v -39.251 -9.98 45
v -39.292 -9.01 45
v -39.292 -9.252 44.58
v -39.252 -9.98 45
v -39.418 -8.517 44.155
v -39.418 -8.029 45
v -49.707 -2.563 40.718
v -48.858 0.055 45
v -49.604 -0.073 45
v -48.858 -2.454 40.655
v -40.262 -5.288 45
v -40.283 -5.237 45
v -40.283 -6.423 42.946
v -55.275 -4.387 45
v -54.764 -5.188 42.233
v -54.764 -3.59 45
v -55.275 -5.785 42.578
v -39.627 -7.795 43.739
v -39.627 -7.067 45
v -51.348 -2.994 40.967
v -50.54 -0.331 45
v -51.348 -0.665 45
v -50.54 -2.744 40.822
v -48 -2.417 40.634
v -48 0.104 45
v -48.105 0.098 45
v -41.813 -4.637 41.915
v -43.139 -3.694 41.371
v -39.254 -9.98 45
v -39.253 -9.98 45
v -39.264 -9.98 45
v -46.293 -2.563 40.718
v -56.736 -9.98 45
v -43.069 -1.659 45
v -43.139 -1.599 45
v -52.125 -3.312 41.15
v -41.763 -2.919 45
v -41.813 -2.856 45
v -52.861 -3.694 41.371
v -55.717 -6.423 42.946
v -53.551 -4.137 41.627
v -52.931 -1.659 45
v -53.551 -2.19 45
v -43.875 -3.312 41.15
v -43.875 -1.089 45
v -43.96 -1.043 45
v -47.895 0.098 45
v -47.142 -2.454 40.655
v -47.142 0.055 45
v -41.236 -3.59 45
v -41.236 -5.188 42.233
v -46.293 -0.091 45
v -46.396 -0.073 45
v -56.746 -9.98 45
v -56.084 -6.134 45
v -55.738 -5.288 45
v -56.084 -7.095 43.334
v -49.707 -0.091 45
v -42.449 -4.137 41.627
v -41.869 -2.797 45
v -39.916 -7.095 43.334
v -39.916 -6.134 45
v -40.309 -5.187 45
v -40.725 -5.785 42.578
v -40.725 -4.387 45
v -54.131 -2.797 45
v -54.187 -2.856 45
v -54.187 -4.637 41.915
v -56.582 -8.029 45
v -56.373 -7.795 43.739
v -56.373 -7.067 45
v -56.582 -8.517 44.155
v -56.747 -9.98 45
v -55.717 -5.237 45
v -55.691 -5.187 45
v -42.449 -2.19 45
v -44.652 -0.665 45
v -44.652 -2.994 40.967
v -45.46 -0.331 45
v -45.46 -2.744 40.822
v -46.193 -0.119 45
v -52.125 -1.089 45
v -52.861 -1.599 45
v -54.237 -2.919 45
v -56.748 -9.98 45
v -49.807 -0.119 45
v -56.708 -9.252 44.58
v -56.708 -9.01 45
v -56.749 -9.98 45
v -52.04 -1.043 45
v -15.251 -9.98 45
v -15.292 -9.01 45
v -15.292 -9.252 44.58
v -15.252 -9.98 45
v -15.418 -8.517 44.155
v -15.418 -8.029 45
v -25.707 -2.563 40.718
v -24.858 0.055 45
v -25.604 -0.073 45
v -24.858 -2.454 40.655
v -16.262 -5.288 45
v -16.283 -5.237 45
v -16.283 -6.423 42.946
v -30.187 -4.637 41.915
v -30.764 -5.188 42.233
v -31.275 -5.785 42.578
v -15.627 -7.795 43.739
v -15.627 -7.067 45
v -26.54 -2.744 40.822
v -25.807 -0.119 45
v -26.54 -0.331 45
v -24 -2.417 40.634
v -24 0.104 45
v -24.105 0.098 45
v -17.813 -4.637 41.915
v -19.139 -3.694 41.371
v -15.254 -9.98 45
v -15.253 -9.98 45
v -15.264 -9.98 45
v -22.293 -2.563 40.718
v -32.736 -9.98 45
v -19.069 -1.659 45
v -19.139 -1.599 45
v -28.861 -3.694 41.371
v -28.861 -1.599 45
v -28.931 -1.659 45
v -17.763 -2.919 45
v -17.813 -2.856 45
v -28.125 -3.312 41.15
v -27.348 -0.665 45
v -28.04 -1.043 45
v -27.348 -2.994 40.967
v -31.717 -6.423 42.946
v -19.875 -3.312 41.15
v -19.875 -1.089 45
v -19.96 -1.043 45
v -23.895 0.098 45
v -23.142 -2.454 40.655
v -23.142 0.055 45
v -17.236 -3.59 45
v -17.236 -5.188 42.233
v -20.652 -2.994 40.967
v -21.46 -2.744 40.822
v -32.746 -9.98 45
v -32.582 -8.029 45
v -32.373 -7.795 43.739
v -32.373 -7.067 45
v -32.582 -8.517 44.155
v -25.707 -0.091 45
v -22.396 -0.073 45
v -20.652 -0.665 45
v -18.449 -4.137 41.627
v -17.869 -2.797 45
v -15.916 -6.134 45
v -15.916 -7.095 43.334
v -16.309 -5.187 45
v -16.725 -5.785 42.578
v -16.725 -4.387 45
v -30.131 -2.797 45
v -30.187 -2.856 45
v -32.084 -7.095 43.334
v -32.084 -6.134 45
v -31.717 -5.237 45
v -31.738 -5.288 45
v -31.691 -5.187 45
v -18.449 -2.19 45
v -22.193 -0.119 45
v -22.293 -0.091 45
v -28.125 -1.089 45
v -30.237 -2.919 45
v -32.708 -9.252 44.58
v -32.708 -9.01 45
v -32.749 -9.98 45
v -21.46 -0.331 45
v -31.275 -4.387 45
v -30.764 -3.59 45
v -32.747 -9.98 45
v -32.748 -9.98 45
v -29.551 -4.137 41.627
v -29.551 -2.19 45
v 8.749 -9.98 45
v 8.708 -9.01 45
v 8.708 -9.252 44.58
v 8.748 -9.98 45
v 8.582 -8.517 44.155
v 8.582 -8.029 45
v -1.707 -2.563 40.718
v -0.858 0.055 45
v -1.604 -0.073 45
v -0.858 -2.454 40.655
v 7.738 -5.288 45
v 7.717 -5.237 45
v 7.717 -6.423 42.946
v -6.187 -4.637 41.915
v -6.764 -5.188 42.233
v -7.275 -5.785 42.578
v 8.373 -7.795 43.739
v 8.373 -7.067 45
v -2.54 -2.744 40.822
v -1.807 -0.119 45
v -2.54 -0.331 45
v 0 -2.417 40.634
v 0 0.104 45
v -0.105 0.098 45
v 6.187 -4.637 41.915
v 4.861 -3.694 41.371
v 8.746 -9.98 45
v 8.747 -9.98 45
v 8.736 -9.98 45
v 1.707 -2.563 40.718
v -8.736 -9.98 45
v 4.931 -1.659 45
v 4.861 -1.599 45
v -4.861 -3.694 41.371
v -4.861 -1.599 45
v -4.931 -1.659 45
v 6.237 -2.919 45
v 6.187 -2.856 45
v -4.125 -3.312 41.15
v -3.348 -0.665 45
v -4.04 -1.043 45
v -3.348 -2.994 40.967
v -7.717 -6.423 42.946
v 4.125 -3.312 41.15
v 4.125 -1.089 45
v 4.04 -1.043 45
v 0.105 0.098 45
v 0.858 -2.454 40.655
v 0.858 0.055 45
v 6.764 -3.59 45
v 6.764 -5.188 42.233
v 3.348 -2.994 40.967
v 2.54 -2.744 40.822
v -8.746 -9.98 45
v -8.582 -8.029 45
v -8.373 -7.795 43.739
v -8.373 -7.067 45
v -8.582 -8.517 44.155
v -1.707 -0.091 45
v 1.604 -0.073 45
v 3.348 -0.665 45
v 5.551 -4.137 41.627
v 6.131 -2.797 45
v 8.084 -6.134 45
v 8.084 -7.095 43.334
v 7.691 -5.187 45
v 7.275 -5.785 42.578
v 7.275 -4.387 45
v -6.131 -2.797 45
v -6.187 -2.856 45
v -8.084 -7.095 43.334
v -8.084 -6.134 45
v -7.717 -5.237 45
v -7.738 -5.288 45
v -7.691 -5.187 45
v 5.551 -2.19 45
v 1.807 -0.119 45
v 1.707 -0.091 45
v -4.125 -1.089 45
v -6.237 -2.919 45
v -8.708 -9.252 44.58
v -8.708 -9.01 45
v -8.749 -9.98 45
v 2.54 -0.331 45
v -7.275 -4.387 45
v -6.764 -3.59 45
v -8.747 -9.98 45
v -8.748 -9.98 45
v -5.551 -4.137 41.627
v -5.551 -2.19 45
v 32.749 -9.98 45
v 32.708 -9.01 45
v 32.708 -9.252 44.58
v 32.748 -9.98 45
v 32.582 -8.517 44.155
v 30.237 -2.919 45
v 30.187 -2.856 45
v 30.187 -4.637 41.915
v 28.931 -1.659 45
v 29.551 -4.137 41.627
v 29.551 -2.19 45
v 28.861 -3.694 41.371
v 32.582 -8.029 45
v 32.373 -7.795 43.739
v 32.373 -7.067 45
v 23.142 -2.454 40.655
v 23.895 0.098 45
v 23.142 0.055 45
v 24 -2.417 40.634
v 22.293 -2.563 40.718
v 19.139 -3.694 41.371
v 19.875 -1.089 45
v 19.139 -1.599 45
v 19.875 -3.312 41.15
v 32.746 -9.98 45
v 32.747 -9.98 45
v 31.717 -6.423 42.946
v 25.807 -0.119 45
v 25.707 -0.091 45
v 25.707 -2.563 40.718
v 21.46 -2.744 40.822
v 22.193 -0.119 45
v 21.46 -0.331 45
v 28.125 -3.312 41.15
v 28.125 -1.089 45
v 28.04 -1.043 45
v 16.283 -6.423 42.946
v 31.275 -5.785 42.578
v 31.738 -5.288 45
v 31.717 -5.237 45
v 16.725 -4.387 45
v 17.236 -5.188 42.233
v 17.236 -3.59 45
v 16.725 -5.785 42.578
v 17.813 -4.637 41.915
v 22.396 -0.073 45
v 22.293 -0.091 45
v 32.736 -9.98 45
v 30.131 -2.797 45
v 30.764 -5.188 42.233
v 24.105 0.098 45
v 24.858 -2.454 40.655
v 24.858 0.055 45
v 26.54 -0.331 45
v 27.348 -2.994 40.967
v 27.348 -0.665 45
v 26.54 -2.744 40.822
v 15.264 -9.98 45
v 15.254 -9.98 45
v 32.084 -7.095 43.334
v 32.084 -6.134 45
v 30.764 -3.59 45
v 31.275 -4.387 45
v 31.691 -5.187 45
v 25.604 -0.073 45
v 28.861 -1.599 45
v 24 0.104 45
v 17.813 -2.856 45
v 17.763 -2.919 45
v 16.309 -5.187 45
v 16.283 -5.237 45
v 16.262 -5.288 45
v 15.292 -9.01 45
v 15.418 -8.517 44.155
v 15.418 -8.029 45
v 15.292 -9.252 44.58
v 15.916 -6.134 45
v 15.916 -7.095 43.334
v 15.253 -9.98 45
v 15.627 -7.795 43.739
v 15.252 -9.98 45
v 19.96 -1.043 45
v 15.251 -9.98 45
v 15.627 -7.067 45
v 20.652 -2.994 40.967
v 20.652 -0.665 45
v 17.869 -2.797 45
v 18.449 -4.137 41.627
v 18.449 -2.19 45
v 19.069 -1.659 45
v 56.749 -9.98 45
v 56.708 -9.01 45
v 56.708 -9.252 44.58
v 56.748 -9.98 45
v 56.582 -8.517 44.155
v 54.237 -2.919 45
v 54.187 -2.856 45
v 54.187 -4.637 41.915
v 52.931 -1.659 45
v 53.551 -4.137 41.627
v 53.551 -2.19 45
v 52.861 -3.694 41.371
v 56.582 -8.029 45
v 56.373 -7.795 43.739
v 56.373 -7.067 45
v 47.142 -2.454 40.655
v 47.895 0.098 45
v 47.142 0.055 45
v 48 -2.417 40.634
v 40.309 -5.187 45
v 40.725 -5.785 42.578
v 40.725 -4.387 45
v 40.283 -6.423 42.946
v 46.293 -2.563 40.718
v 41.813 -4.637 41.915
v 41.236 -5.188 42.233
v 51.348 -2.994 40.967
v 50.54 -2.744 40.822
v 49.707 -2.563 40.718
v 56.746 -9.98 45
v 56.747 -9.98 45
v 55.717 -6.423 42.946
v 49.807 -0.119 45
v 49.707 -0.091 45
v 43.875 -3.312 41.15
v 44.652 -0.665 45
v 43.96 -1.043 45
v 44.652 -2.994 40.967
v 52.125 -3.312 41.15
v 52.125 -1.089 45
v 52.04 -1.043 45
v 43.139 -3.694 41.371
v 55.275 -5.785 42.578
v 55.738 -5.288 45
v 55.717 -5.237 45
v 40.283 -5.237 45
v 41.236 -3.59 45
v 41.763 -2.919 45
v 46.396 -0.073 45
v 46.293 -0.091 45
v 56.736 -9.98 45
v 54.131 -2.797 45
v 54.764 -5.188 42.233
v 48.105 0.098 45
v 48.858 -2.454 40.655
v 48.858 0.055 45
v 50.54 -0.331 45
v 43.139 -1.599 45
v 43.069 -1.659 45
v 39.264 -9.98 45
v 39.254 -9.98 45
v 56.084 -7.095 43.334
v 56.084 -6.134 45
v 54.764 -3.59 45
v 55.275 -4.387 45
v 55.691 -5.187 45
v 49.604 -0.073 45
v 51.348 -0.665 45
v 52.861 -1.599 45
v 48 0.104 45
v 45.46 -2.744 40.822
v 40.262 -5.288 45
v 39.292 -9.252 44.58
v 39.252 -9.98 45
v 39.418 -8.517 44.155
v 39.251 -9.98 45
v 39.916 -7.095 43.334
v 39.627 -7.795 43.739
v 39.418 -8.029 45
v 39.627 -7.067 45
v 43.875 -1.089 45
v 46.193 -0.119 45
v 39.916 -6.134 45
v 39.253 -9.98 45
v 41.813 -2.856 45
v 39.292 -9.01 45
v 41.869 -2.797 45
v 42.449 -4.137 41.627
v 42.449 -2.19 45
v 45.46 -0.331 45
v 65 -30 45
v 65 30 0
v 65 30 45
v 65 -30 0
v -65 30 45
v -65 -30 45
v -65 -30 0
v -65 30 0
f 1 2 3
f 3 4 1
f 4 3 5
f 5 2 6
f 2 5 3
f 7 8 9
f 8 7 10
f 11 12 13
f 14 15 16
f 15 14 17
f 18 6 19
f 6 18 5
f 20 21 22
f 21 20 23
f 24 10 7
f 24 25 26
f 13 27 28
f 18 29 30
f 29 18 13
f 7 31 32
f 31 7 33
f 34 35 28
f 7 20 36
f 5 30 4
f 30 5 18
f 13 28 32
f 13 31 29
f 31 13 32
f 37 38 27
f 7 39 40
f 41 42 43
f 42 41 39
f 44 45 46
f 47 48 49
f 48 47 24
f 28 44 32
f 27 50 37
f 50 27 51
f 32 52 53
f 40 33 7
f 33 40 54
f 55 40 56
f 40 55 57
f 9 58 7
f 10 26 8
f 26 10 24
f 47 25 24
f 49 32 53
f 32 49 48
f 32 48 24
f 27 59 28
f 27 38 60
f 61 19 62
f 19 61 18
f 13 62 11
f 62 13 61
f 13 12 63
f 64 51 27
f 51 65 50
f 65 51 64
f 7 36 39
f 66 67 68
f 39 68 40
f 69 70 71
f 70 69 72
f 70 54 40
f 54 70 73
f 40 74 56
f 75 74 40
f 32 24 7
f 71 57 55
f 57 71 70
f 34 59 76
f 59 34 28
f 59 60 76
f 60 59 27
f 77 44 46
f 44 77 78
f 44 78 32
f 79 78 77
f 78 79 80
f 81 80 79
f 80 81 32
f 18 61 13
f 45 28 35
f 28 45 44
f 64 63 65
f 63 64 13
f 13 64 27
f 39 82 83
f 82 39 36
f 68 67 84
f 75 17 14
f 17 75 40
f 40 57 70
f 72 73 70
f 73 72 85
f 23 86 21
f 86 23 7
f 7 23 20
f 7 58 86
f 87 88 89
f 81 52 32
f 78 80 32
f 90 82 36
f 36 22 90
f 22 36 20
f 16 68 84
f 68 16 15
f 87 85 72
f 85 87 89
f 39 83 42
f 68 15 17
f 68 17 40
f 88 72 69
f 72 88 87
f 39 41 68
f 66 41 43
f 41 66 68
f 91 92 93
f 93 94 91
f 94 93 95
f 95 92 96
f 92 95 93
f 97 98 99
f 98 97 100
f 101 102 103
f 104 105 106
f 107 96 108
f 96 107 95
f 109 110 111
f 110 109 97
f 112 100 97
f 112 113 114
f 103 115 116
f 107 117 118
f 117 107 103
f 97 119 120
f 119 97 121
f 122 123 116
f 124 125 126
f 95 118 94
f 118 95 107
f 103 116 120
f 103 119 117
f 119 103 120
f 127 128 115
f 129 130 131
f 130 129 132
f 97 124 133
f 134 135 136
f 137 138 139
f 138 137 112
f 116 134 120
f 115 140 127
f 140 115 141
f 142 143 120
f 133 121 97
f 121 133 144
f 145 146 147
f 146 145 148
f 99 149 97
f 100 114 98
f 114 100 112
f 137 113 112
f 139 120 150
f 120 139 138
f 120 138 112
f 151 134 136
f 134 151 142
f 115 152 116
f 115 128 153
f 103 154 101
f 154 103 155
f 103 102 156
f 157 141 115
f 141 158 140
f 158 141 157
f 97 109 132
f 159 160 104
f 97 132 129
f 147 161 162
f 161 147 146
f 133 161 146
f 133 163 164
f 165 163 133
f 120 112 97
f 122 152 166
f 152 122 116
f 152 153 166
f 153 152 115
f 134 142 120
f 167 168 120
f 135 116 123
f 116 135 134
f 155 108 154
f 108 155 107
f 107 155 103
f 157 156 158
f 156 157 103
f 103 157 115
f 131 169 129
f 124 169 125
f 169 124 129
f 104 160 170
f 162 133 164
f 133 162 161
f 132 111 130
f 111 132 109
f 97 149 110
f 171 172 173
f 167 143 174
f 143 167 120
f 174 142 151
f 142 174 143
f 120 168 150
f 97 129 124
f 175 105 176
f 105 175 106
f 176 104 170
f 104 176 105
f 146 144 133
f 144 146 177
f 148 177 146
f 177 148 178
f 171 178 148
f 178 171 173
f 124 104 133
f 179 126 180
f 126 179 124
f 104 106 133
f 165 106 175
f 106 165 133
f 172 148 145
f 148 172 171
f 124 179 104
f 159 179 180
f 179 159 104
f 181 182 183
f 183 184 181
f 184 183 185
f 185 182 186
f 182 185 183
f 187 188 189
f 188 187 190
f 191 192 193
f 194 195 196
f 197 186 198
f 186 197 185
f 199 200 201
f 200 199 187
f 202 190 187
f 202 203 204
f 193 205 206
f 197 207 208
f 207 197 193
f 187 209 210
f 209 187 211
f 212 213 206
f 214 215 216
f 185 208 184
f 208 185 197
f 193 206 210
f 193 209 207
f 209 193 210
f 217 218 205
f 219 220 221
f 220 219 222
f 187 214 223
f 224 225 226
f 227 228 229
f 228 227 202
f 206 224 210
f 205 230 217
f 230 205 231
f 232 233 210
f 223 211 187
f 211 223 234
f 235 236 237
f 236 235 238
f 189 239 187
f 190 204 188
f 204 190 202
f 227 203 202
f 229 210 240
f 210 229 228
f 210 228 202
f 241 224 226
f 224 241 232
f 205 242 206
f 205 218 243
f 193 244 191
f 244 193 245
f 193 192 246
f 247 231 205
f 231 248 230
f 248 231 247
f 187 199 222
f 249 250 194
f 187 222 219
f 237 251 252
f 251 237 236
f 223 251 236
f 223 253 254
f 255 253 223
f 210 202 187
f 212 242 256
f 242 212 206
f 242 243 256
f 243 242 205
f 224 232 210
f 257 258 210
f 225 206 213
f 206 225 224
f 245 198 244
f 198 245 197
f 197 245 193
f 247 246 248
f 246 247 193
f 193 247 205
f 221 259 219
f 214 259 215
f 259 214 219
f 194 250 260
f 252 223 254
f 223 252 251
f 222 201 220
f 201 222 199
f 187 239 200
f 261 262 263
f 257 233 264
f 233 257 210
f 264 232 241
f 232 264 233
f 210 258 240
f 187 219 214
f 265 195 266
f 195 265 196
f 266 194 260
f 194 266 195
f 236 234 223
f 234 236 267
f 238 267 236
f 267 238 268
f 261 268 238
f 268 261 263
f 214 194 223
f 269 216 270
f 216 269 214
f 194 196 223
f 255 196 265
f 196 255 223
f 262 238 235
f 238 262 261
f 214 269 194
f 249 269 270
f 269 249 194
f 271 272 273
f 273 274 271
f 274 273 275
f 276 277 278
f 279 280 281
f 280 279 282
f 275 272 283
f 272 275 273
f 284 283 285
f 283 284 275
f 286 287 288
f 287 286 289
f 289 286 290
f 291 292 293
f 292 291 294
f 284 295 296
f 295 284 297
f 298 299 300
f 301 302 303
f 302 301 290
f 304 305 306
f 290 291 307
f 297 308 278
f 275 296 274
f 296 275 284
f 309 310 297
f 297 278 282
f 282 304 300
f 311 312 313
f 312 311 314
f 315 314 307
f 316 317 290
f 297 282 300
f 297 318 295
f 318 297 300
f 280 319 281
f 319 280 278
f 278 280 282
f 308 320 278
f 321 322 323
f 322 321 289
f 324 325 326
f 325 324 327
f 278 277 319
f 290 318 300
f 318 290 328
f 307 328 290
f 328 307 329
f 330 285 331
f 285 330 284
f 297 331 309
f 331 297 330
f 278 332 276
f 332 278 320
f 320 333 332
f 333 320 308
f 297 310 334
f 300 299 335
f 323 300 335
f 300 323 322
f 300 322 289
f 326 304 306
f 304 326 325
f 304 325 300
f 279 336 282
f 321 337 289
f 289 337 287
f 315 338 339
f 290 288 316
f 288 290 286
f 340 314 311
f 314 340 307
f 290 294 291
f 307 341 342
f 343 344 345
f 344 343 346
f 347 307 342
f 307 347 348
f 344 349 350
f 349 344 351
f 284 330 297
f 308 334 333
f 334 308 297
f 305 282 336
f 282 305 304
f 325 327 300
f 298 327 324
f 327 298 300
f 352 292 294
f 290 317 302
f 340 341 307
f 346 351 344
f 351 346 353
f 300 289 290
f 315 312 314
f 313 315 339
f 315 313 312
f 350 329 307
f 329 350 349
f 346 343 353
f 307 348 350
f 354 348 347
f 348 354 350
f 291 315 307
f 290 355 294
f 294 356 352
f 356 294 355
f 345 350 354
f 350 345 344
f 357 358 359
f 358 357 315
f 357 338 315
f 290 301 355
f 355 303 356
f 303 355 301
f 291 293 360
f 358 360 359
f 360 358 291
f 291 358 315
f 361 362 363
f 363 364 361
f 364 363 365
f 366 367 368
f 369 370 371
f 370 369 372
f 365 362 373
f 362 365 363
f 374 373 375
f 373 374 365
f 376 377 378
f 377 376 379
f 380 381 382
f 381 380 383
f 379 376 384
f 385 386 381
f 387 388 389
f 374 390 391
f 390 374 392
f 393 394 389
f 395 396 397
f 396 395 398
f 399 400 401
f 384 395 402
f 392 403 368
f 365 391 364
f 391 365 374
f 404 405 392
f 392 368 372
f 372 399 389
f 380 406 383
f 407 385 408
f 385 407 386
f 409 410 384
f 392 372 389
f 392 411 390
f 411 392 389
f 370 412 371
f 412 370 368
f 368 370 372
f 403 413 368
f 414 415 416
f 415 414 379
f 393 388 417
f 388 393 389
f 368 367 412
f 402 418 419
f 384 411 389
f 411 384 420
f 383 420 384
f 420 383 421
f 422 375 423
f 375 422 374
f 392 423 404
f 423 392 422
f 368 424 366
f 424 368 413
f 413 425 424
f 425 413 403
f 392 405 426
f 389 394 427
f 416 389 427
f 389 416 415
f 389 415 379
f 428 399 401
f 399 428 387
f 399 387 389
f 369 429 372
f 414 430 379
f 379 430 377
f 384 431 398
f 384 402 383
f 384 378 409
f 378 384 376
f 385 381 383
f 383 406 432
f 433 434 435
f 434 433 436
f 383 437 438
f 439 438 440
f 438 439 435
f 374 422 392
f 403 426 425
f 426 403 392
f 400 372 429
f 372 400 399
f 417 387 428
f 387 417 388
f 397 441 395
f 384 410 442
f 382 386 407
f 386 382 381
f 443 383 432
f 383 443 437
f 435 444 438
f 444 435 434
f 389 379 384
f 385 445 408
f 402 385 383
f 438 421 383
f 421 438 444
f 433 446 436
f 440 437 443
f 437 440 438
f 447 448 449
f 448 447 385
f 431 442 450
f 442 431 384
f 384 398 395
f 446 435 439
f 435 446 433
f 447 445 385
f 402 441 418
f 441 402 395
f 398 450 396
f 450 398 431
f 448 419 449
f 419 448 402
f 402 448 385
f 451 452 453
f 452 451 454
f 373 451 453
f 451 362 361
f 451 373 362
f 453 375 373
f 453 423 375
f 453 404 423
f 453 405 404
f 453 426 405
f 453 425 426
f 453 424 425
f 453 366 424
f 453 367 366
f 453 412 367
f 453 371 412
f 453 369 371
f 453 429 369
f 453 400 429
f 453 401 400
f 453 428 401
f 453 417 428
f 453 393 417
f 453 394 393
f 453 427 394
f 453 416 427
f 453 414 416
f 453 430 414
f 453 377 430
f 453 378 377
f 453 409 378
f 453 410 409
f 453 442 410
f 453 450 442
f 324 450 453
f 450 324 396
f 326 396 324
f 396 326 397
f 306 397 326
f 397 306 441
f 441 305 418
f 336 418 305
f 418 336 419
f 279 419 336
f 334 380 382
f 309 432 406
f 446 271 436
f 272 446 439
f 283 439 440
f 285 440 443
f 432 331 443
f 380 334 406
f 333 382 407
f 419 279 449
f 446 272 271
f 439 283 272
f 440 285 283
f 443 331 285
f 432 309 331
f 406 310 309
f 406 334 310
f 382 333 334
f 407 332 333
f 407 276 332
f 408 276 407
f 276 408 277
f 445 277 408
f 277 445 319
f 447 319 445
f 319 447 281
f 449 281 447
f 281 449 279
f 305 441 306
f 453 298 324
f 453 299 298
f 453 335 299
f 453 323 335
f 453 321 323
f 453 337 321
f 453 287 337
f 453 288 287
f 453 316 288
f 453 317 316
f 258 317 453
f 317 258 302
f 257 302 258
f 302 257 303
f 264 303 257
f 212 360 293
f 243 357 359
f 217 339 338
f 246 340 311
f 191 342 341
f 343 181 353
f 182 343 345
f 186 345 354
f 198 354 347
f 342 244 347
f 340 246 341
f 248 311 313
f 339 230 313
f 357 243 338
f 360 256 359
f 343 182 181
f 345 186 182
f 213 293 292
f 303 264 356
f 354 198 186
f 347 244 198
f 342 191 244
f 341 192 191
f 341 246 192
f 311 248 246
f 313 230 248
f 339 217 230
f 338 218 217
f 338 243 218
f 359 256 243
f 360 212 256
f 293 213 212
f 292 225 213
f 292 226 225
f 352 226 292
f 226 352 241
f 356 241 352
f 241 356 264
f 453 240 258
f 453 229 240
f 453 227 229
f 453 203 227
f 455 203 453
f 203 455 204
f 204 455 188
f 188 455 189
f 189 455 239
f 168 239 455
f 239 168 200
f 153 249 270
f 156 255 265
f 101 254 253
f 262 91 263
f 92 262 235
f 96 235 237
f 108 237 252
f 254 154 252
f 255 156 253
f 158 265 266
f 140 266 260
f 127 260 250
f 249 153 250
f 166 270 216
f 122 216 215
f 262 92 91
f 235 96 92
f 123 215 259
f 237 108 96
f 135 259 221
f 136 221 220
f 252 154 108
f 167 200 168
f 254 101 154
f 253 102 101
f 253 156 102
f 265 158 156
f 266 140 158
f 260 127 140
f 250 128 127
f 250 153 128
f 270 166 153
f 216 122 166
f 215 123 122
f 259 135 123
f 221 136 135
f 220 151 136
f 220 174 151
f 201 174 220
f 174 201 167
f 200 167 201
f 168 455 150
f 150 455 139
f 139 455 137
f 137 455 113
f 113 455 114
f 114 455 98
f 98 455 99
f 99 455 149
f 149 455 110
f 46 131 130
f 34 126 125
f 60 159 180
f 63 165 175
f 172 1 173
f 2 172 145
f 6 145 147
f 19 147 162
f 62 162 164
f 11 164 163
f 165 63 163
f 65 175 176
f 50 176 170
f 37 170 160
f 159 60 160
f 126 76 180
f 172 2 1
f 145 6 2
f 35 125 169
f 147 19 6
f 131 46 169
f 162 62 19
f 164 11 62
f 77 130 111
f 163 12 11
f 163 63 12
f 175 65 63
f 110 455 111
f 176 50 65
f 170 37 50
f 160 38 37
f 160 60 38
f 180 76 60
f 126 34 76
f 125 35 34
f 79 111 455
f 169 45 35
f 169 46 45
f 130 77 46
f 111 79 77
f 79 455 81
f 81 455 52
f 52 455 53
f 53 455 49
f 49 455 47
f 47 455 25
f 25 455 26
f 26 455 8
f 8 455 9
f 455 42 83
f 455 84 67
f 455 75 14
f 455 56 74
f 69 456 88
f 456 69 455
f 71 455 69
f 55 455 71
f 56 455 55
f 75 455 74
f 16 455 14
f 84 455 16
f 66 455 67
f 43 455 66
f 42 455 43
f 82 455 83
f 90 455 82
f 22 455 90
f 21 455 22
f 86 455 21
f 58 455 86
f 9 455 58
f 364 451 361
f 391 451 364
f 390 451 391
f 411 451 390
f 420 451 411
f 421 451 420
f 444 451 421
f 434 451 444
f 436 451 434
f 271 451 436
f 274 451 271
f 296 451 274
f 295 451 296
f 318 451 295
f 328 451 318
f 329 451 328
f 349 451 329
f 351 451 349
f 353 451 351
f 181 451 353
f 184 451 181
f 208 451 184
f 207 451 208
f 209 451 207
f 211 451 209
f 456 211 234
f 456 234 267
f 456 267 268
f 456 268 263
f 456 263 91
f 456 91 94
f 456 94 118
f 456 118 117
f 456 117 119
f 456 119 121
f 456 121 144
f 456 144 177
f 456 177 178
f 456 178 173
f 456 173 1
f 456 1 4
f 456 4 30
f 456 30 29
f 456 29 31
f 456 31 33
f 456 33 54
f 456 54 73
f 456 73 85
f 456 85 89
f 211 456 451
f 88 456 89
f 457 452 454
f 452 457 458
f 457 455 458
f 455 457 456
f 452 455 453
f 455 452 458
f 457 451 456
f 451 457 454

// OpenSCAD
// --- Parameters ---
// Block dimensions
block_x = 130;           // Total length (X)
block_y = 60;            // Total depth (Y)
block_z = 45;            // Total height (Z)

// Hole properties
hole_diameter = 17.5;    // Diameter of the conical tube hole
hole_depth = 40;         // Depth of the hole along its axis
num_holes = 5;           // Number of tubes
hole_spacing = 24;       // Distance between hole centers along X

// Tilt properties
tilt_angle = 30;         // Angle from vertical in YZ plane
tilt_y_offset = -10;      // Y-coordinate where the hole axis meets the top face

// Resolution
fn_val = 64;             // Smoothness for cylinders

// --- Calculations ---
// The user specified the part rests on the bed at Z=0 and builds upward.
// The previous error was using cube(center=true), which placed the block at Z = -22.5.
// We will use a non-centered cube and translate it so the bottom face is at Z=0.

// Calculate the starting X position for the first hole to ensure the set is centered
hole_span = (num_holes - 1) * hole_spacing;
first_hole_x = -hole_span / 2;

// --- Modeling ---

// Main Block
difference() {
    // The solid block
    // We place the bottom face at Z=0. 
    // To center on X and Y, we translate by [-block_x/2, -block_y/2, 0]
    translate([-block_x/2, -block_y/2, 0])
        cube([block_x, block_y, block_z]);

    // The five blind holes
    for (i = [0 : num_holes - 1]) {
        // Calculate X position for this specific hole
        current_hole_x = first_hole_x + (i * hole_spacing);
        
        // The hole axis is tilted 30 degrees from vertical in the YZ plane.
        // "Going down into the block, it moves toward +Y"
        // The top face is at Z = block_z.
        // The hole axis meets the top face at (current_hole_x, tilt_y_offset, block_z).
        
        // To achieve the tilt:
        // 1. Move to the intersection point on the top face.
        // 2. Rotate around X axis to tilt the Z axis towards +Y.
        //    A rotation of -30 degrees around X moves the +Z axis towards +Y.
        // 3. Translate along the new Z axis to create the depth.
        
        translate([current_hole_x, tilt_y_offset, block_z]) 
        rotate([-tilt_angle, 0, 0]) 
        // We use a cylinder that is slightly longer and offset to ensure it cuts through the top face cleanly
        translate([0, 0, 0.01]) 
        cylinder(h = hole_depth + 1, d = hole_diameter, $fn = fn_val);
    }
}

// Verification of requirements:
// 1. Block: 130x60x45.
// 2. Centered on X and Y: Handled by translate([-65, -30, 0]).
// 3. Rests on bed at Z=0: Handled by Z=0 start.
// 4. 5 holes, 24mm apart, centered on X: Handled by first_hole_x calculation.
// 5. Hole diameter 17.5mm: Handled.
// 6. Hole depth 40mm: Handled.
// 7. Tilt 30 deg in YZ plane, moving toward +Y: Handled by rotate([-30, 0, 0]).
// 8. Hole axis meets top face at y = -10: Handled by translate([..., -10, block_z]).
